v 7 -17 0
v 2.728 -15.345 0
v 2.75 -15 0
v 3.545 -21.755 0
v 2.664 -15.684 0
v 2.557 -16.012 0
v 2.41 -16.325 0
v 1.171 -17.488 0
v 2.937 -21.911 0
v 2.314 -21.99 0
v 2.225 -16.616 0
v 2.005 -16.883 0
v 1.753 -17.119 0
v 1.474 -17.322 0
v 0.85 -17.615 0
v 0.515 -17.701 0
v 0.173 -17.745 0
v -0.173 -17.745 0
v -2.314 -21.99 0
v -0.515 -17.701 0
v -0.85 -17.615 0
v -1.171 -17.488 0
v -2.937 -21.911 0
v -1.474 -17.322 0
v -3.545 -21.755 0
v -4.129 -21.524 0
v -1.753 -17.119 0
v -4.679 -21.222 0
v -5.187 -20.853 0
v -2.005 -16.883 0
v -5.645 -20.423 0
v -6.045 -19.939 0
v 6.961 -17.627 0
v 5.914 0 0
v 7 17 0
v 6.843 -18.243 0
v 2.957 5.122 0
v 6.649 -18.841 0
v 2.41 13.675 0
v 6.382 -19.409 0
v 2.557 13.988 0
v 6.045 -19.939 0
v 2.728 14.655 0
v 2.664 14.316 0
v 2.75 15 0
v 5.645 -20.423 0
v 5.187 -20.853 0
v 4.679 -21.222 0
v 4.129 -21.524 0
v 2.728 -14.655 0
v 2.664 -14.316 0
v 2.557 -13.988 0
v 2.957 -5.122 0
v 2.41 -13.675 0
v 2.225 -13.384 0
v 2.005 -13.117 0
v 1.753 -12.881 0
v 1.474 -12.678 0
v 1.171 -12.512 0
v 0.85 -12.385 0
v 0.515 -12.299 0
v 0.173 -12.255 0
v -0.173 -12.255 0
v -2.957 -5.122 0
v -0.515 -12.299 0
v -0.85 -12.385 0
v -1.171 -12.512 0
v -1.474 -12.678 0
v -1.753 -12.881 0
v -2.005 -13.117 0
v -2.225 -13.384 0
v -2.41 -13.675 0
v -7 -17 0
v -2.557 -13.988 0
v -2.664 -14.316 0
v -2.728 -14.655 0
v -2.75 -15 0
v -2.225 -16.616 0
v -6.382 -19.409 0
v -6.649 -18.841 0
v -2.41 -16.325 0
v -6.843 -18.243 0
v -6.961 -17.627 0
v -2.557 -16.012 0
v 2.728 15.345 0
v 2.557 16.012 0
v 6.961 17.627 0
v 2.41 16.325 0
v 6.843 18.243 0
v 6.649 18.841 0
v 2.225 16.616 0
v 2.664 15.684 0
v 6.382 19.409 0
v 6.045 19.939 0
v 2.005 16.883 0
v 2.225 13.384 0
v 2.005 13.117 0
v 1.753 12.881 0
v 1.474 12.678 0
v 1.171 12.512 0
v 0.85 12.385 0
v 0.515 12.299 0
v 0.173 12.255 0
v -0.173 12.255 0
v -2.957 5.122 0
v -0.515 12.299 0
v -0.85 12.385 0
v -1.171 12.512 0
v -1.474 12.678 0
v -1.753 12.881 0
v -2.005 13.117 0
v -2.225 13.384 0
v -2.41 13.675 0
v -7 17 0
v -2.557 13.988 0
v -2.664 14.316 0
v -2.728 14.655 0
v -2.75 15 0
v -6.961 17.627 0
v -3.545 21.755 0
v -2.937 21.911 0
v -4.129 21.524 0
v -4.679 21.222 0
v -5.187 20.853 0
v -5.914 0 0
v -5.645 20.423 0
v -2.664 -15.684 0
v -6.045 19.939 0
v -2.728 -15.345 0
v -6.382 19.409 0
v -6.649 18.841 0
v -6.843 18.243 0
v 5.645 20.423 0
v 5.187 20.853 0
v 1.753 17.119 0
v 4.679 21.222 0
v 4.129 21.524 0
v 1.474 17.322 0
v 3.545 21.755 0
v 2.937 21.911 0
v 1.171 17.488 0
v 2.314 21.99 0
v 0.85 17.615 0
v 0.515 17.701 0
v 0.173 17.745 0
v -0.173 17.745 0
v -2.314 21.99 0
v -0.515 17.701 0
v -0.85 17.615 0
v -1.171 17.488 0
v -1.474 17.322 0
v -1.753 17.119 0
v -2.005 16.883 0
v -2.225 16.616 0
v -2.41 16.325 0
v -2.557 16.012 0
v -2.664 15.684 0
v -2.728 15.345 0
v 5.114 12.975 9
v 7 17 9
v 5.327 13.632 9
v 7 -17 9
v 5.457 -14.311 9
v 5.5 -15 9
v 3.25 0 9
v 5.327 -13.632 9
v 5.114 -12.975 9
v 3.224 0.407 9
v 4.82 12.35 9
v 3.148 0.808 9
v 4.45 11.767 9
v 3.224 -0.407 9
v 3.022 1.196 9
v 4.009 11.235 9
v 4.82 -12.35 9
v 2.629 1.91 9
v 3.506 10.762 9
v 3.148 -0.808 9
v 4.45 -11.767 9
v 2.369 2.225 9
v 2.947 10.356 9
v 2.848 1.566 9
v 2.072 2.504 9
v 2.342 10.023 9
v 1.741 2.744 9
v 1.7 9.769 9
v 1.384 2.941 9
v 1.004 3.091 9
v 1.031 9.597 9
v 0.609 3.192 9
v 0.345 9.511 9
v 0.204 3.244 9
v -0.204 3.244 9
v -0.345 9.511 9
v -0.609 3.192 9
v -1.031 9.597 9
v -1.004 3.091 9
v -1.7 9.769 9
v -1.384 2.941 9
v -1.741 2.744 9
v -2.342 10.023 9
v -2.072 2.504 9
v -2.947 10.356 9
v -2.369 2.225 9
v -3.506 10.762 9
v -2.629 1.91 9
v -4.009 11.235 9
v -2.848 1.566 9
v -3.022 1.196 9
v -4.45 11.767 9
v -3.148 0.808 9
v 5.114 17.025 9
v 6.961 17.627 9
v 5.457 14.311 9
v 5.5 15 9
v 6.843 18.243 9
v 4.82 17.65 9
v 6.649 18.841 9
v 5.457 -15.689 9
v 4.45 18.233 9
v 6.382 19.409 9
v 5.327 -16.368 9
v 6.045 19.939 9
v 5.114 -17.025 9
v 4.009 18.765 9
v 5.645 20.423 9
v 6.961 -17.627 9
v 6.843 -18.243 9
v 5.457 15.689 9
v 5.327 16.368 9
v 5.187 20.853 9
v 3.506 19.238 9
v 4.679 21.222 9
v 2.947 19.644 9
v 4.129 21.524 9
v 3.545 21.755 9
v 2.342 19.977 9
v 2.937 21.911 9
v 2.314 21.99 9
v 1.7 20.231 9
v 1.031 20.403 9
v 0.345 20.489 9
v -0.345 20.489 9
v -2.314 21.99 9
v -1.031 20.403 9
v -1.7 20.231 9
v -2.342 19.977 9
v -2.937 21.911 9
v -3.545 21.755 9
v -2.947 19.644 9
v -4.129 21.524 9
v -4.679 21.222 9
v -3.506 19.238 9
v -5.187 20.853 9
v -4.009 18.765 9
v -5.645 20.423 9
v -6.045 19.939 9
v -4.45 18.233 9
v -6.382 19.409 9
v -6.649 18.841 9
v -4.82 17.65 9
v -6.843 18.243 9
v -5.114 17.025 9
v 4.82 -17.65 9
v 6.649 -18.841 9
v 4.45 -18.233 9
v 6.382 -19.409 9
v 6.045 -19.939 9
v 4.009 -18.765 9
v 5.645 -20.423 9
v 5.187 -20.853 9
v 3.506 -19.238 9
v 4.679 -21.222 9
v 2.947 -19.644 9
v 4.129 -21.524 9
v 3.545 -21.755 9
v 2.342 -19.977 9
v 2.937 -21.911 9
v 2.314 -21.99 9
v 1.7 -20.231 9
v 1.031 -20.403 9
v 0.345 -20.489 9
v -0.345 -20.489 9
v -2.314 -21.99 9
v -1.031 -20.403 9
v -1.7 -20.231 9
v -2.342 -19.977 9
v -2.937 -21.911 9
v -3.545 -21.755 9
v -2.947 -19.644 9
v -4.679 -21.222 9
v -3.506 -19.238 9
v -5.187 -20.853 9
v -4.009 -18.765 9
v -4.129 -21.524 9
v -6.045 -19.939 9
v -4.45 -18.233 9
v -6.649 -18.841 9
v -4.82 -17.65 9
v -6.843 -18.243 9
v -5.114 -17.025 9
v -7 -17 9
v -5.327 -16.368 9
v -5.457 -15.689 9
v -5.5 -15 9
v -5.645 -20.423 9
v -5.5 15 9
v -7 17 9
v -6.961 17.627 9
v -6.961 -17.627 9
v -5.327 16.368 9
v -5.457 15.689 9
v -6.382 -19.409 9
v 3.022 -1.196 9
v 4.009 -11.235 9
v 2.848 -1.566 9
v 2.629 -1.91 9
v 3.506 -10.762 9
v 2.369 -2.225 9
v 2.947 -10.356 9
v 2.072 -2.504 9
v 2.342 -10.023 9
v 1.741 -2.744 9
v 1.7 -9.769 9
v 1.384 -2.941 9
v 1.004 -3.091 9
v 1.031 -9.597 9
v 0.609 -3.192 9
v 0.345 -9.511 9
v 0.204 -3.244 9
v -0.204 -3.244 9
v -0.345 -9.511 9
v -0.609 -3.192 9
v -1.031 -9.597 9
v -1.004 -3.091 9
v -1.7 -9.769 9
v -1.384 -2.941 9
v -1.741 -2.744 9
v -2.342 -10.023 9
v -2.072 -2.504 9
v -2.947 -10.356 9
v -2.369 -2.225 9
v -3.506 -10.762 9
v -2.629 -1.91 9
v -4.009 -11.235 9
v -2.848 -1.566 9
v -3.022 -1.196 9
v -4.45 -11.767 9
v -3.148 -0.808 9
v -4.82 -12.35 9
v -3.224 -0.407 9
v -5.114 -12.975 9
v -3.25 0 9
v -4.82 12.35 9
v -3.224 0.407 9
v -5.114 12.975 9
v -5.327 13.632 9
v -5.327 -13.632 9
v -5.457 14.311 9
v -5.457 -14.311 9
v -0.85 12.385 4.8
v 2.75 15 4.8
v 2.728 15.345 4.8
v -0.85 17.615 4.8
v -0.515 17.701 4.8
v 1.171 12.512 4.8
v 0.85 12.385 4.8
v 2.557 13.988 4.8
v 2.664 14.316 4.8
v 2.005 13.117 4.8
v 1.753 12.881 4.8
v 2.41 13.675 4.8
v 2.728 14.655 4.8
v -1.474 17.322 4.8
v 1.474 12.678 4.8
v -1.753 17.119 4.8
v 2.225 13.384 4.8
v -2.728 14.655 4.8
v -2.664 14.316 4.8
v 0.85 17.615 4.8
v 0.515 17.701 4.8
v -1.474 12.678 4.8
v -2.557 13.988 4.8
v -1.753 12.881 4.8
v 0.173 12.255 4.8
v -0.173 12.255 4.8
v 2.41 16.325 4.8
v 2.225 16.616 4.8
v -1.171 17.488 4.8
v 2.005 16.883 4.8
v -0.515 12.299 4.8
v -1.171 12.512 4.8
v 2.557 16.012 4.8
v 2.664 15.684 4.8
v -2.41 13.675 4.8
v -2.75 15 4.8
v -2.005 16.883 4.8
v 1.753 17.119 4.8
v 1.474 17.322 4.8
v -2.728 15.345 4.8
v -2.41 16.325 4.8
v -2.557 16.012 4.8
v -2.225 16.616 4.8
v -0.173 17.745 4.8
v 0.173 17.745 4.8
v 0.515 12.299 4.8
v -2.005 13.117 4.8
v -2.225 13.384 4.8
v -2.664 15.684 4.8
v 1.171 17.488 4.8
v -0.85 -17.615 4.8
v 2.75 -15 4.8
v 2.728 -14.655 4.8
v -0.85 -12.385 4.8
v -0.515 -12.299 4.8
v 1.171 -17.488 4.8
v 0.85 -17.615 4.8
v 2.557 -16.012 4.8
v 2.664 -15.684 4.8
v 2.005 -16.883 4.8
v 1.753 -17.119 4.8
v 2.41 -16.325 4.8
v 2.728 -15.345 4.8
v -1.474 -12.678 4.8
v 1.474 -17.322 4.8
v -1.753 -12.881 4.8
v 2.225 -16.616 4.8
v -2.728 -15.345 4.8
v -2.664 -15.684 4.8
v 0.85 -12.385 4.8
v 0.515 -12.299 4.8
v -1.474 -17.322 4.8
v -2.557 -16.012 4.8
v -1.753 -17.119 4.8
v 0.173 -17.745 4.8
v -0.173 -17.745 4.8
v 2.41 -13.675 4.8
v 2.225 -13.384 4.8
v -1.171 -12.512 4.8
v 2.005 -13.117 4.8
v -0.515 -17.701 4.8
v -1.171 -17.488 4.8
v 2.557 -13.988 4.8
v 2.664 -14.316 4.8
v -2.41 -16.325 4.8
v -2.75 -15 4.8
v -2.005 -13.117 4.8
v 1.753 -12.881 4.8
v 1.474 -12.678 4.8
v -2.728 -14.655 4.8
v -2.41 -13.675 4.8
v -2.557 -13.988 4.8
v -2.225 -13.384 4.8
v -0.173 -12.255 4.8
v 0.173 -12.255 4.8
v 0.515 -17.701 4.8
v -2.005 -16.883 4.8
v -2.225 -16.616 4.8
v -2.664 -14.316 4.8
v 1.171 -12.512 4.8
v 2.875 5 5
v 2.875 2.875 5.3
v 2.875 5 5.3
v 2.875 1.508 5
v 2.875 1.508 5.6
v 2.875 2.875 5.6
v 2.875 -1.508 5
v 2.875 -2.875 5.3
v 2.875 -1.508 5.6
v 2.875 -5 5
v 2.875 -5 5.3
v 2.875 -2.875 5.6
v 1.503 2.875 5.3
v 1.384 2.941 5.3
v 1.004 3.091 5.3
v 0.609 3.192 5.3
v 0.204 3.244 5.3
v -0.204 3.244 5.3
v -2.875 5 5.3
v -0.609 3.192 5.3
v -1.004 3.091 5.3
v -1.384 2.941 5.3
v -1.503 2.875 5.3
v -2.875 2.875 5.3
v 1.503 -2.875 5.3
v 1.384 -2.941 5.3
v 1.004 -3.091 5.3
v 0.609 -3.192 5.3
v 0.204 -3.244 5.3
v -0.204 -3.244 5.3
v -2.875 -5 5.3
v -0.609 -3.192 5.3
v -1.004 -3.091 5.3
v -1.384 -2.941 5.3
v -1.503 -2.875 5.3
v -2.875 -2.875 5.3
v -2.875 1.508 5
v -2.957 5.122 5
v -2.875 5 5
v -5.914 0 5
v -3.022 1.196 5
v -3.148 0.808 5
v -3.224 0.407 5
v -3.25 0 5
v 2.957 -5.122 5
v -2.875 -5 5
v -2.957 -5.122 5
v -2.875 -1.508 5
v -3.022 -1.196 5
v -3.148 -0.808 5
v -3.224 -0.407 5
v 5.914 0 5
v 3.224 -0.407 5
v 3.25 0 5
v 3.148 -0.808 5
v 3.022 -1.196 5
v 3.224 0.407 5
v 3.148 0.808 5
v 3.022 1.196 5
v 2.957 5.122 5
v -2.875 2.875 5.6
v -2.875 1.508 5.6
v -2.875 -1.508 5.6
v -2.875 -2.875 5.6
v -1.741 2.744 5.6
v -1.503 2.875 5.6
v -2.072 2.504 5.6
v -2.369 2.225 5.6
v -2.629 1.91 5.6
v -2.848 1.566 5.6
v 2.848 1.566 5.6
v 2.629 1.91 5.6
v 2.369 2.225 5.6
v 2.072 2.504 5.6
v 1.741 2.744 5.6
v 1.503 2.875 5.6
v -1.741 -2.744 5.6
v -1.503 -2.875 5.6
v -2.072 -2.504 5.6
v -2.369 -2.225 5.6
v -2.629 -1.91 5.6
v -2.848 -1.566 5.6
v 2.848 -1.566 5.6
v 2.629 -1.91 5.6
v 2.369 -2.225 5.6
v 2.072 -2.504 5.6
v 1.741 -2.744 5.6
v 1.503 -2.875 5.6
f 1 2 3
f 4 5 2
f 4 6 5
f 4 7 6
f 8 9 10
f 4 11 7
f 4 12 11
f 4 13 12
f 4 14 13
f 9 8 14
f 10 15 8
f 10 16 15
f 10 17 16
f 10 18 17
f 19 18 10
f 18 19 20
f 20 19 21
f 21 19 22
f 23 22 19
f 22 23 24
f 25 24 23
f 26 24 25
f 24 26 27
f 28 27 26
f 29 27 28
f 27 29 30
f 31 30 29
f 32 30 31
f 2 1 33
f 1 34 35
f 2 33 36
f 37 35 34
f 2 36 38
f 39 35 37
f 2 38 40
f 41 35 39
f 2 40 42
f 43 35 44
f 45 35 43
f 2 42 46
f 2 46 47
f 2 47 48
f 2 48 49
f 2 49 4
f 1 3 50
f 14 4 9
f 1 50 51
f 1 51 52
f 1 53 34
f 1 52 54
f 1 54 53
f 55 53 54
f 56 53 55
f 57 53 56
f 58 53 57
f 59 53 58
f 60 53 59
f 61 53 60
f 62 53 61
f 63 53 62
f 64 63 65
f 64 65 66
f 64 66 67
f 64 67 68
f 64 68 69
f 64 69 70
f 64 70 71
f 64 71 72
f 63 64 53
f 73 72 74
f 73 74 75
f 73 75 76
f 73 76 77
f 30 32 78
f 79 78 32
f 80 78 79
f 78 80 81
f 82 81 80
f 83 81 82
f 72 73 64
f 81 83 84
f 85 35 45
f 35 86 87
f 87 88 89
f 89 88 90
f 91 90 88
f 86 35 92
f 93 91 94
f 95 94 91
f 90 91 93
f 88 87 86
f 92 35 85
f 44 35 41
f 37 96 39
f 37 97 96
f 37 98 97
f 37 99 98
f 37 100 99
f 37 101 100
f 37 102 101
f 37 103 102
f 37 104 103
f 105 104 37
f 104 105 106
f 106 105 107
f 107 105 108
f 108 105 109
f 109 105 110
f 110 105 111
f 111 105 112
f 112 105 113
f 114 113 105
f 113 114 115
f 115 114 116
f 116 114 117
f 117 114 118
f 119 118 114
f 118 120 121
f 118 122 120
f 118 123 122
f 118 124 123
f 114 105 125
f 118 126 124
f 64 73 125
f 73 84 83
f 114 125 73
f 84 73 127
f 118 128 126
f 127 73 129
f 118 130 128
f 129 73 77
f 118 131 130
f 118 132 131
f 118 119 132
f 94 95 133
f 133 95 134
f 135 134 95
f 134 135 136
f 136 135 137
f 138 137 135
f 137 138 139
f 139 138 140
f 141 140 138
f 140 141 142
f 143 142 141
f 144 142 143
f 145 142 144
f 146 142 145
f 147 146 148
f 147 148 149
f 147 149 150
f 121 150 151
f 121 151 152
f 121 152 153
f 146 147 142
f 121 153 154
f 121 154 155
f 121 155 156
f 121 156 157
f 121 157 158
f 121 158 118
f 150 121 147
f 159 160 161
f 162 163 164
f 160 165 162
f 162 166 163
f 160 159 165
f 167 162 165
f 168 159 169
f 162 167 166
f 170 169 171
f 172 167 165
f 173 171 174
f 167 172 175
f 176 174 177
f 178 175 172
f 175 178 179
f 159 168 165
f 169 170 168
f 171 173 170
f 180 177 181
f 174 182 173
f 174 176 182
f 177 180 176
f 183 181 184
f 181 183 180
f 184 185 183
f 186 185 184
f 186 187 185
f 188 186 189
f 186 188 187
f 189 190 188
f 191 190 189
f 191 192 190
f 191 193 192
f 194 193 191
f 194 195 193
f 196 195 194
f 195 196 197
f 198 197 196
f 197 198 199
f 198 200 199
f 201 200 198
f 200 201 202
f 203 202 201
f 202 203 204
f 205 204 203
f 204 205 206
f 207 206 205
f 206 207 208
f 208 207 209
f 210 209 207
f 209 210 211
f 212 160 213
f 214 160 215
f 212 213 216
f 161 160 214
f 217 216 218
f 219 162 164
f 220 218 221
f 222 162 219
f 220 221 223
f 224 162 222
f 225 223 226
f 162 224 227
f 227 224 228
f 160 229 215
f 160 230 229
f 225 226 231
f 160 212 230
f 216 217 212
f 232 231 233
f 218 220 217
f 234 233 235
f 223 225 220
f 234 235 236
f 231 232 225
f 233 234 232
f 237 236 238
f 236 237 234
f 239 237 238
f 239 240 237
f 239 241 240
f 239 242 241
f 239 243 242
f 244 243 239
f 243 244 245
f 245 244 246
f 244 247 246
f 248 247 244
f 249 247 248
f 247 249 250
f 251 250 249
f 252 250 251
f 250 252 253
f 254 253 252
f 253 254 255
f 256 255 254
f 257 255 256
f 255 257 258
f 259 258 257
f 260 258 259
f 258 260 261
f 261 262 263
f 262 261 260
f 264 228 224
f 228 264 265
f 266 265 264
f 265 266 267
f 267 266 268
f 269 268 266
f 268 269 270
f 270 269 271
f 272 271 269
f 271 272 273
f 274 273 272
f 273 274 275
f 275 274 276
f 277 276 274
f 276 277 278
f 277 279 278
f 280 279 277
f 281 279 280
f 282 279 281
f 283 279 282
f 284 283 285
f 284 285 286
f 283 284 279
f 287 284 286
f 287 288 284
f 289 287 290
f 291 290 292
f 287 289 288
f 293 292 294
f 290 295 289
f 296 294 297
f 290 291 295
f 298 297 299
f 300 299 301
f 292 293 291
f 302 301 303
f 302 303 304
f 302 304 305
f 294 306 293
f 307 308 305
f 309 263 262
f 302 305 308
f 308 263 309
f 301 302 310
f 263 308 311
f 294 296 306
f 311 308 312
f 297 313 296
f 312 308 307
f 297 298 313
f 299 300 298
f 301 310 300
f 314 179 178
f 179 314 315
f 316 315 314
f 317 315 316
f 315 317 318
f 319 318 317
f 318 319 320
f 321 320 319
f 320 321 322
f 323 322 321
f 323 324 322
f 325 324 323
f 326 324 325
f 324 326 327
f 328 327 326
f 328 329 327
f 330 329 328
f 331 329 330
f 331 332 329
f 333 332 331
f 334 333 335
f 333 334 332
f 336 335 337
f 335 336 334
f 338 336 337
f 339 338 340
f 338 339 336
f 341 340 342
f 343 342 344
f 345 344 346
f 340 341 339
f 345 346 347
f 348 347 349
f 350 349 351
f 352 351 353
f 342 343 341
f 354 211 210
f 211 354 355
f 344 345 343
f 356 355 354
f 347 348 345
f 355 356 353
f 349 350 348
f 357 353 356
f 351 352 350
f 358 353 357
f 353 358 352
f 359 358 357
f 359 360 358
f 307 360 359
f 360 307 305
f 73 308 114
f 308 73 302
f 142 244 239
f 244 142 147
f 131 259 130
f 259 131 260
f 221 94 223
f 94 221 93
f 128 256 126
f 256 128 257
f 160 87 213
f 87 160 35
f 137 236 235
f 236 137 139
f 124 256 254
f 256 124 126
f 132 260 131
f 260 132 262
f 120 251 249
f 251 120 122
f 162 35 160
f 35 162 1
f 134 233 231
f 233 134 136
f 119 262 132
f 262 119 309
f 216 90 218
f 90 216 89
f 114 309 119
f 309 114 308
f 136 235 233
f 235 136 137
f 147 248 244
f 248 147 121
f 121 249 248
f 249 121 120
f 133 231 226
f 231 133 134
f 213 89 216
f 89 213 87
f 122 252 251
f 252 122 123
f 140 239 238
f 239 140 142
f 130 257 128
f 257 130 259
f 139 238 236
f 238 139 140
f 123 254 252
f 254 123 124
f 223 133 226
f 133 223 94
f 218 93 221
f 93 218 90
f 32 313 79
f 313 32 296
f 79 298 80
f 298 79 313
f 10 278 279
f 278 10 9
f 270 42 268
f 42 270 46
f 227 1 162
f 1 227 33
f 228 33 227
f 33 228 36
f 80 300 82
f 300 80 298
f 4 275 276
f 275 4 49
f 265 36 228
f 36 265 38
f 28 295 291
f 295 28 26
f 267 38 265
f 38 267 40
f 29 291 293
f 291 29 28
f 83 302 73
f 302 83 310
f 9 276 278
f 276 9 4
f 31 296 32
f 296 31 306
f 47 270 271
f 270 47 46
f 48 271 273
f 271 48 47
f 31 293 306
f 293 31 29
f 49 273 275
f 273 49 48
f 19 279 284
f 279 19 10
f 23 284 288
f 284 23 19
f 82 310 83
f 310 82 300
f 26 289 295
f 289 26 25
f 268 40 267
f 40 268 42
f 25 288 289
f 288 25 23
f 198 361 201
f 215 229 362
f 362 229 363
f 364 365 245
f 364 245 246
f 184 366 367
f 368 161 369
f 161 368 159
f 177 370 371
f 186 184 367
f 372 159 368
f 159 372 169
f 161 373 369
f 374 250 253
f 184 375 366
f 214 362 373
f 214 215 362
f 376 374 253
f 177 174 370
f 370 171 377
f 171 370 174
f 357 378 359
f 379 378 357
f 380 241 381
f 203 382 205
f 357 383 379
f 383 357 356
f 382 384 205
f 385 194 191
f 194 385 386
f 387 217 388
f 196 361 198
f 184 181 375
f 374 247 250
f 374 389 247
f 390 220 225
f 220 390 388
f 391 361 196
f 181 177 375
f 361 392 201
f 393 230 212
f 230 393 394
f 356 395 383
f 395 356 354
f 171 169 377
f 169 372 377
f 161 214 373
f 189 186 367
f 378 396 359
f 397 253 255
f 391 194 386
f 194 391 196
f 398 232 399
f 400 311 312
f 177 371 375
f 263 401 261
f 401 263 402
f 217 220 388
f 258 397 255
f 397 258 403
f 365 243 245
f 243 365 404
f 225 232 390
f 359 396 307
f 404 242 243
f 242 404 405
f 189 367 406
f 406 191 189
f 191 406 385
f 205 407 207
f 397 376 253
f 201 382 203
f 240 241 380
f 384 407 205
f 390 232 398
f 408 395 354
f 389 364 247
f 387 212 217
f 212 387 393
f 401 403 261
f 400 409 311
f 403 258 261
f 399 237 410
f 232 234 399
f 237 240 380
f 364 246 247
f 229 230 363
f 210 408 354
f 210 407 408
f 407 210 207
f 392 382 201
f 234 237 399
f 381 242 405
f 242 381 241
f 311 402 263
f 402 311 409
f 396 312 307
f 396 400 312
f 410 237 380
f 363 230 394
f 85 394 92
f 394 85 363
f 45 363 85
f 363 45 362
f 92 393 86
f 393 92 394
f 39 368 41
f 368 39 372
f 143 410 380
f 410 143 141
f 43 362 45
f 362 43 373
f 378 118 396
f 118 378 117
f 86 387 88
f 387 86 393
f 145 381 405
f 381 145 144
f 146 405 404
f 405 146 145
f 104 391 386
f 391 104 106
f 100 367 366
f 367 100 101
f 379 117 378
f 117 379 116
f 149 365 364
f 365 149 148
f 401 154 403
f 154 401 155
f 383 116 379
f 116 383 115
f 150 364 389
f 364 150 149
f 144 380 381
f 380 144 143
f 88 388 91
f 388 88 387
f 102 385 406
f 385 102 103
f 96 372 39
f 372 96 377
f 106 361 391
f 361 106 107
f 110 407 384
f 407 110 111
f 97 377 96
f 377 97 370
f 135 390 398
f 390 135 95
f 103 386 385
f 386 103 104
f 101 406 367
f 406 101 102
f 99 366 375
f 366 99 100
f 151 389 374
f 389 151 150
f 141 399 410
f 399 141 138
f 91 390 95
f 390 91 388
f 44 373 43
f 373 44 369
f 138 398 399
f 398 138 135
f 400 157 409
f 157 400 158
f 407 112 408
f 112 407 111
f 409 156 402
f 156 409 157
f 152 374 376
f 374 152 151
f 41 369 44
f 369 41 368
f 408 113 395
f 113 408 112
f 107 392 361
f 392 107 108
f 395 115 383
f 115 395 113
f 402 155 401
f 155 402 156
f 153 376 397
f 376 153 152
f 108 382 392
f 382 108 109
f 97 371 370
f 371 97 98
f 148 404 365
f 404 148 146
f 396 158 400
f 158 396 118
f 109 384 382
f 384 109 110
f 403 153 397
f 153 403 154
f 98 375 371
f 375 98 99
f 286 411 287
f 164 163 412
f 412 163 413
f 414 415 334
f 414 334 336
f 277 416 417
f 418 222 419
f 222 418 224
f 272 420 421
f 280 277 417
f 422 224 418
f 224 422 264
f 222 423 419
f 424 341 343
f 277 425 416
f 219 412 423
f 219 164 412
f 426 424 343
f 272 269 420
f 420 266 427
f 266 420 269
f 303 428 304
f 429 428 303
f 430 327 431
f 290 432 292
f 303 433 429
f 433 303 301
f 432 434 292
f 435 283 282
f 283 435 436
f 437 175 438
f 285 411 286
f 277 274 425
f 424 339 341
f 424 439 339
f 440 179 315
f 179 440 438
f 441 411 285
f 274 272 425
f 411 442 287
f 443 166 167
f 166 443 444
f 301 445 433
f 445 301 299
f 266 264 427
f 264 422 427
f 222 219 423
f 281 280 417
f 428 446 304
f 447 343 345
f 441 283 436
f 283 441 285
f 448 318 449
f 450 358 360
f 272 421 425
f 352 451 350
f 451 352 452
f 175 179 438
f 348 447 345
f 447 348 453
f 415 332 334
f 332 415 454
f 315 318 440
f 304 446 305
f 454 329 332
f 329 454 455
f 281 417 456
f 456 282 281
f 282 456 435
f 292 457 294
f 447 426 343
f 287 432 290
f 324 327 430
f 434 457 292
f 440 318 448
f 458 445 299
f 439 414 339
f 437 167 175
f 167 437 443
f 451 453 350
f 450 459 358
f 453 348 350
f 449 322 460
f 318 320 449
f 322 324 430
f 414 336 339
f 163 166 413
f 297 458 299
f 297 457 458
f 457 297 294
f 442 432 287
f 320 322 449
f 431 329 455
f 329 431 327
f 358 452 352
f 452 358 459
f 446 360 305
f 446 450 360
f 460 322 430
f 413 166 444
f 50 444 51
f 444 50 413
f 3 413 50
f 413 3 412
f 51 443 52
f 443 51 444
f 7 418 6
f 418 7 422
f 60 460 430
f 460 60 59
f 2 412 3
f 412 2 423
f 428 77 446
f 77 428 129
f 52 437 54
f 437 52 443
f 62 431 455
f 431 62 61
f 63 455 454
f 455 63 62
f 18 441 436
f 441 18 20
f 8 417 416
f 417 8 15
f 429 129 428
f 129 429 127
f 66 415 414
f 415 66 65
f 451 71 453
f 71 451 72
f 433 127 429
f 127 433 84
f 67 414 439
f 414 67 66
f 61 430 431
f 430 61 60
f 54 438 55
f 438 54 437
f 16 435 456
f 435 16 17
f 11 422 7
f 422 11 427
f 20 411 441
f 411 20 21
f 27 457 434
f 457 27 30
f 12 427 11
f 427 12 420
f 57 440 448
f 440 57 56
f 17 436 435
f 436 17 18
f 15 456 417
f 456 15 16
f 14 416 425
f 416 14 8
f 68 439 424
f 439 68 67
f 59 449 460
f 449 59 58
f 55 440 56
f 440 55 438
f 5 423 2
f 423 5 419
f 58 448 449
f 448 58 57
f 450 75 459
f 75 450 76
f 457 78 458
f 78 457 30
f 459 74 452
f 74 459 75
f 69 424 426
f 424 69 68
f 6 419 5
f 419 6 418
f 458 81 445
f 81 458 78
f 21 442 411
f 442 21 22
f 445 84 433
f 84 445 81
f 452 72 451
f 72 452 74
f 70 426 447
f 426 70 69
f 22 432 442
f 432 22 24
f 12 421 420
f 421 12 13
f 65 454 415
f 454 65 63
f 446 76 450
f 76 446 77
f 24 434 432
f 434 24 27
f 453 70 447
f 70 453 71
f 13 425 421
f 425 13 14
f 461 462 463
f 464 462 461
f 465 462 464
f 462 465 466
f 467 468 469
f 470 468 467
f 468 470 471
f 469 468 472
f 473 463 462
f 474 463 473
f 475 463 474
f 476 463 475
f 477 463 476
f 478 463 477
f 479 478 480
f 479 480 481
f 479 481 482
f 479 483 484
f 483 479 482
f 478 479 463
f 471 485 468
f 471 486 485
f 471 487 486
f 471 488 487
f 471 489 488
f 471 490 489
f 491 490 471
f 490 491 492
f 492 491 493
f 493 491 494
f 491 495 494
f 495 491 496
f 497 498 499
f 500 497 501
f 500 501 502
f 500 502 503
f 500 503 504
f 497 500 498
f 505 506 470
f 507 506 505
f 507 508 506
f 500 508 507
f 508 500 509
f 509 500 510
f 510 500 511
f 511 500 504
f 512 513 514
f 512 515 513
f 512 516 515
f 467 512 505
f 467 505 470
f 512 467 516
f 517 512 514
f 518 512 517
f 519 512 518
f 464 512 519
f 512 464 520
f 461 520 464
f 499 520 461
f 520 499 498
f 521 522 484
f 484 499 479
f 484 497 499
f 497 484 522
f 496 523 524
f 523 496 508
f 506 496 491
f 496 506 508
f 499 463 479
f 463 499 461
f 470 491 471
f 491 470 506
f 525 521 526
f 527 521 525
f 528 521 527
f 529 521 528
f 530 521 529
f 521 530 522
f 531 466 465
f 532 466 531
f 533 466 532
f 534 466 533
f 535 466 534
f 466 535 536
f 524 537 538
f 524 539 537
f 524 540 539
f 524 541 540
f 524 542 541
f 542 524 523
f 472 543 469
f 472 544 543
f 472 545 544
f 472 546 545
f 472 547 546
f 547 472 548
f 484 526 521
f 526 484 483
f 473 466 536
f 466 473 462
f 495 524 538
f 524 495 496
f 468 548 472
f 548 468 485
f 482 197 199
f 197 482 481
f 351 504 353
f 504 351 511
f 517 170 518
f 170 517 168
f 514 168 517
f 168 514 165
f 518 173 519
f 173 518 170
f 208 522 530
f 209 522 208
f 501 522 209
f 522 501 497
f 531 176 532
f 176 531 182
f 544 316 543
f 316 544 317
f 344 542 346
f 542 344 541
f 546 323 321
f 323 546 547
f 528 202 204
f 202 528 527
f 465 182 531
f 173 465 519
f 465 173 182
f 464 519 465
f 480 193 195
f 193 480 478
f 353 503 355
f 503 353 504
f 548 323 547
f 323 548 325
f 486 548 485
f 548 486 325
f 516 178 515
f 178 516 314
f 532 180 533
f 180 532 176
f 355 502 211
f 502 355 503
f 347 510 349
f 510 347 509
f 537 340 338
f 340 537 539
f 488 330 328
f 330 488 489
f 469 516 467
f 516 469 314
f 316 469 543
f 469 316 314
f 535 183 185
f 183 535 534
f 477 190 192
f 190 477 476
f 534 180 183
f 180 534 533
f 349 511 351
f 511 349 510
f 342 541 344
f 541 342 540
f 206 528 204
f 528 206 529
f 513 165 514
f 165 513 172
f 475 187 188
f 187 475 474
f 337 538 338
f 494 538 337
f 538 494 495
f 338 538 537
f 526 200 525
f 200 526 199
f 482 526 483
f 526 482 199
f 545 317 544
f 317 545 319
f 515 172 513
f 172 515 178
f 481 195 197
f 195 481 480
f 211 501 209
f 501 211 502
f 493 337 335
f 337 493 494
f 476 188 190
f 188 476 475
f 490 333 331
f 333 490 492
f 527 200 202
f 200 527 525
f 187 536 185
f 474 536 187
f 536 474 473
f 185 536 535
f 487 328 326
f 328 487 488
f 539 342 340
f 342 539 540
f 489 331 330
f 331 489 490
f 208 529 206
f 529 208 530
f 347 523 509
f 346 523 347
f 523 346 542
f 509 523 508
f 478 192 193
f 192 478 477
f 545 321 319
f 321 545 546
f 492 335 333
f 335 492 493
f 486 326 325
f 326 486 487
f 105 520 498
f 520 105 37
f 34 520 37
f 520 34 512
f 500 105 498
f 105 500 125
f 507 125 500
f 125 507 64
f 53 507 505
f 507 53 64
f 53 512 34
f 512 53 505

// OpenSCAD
$fn = 50;


difference() {
	union() {
		cylinder(h = 9, r = 7.0000000000);
		translate(v = [0.0000000000, 7.5000000000, 0]) {
			hull() {
				translate(v = [-2.0000000000, 9.5000000000, 0]) {
					cylinder(h = 9, r = 5);
				}
				translate(v = [2.0000000000, 9.5000000000, 0]) {
					cylinder(h = 9, r = 5);
				}
				translate(v = [-2.0000000000, -9.5000000000, 0]) {
					cylinder(h = 9, r = 5);
				}
				translate(v = [2.0000000000, -9.5000000000, 0]) {
					cylinder(h = 9, r = 5);
				}
			}
		}
		translate(v = [0.0000000000, 7.5000000000, 0]) {
			hull() {
				translate(v = [-2.0000000000, 9.5000000000, 0]) {
					cylinder(h = 9, r = 5);
				}
				translate(v = [2.0000000000, 9.5000000000, 0]) {
					cylinder(h = 9, r = 5);
				}
				translate(v = [-2.0000000000, -9.5000000000, 0]) {
					cylinder(h = 9, r = 5);
				}
				translate(v = [2.0000000000, -9.5000000000, 0]) {
					cylinder(h = 9, r = 5);
				}
			}
		}
		translate(v = [0.0000000000, -7.5000000000, 0]) {
			hull() {
				translate(v = [-2.0000000000, 9.5000000000, 0]) {
					cylinder(h = 9, r = 5);
				}
				translate(v = [2.0000000000, 9.5000000000, 0]) {
					cylinder(h = 9, r = 5);
				}
				translate(v = [-2.0000000000, -9.5000000000, 0]) {
					cylinder(h = 9, r = 5);
				}
				translate(v = [2.0000000000, -9.5000000000, 0]) {
					cylinder(h = 9, r = 5);
				}
			}
		}
		translate(v = [0.0000000000, -7.5000000000, 0]) {
			hull() {
				translate(v = [-2.0000000000, 9.5000000000, 0]) {
					cylinder(h = 9, r = 5);
				}
				translate(v = [2.0000000000, 9.5000000000, 0]) {
					cylinder(h = 9, r = 5);
				}
				translate(v = [-2.0000000000, -9.5000000000, 0]) {
					cylinder(h = 9, r = 5);
				}
				translate(v = [2.0000000000, -9.5000000000, 0]) {
					cylinder(h = 9, r = 5);
				}
			}
		}
	}
	union() {
		translate(v = [0.0000000000, 15.0000000000, 9]) {
			rotate(a = [0, 0, 0]) {
				difference() {
					union() {
						#translate(v = [0, 0, -9.0000000000]) {
							cylinder(h = 9, r = 2.2500000000);
						}
						#translate(v = [0, 0, -4.2000000000]) {
							cylinder(h = 4.2000000000, r1 = 2.7500000000, r2 = 5.5000000000);
						}
						#translate(v = [0, 0, -9.0000000000]) {
							cylinder(h = 9, r = 2.7500000000);
						}
						#translate(v = [0, 0, -9.0000000000]) {
							cylinder(h = 9, r = 2.2500000000);
						}
					}
					union();
				}
			}
		}
		translate(v = [0.0000000000, 15.0000000000, 9]) {
			rotate(a = [0, 0, 0]) {
				difference() {
					union() {
						#translate(v = [0, 0, -9.0000000000]) {
							cylinder(h = 9, r = 2.2500000000);
						}
						#translate(v = [0, 0, -4.2000000000]) {
							cylinder(h = 4.2000000000, r1 = 2.7500000000, r2 = 5.5000000000);
						}
						#translate(v = [0, 0, -9.0000000000]) {
							cylinder(h = 9, r = 2.7500000000);
						}
						#translate(v = [0, 0, -9.0000000000]) {
							cylinder(h = 9, r = 2.2500000000);
						}
					}
					union();
				}
			}
		}
		translate(v = [0.0000000000, -15.0000000000, 9]) {
			rotate(a = [0, 0, 0]) {
				difference() {
					union() {
						#translate(v = [0, 0, -9.0000000000]) {
							cylinder(h = 9, r = 2.2500000000);
						}
						#translate(v = [0, 0, -4.2000000000]) {
							cylinder(h = 4.2000000000, r1 = 2.7500000000, r2 = 5.5000000000);
						}
						#translate(v = [0, 0, -9.0000000000]) {
							cylinder(h = 9, r = 2.7500000000);
						}
						#translate(v = [0, 0, -9.0000000000]) {
							cylinder(h = 9, r = 2.2500000000);
						}
					}
					union();
				}
			}
		}
		translate(v = [0.0000000000, -15.0000000000, 9]) {
			rotate(a = [0, 0, 0]) {
				difference() {
					union() {
						#translate(v = [0, 0, -9.0000000000]) {
							cylinder(h = 9, r = 2.2500000000);
						}
						#translate(v = [0, 0, -4.2000000000]) {
							cylinder(h = 4.2000000000, r1 = 2.7500000000, r2 = 5.5000000000);
						}
						#translate(v = [0, 0, -9.0000000000]) {
							cylinder(h = 9, r = 2.7500000000);
						}
						#translate(v = [0, 0, -9.0000000000]) {
							cylinder(h = 9, r = 2.2500000000);
						}
					}
					union();
				}
			}
		}
		translate(v = [0.0000000000, 0.0000000000, 0]) {
			rotate(a = [0, 0, 0]) {
				difference() {
					union() {
						#translate(v = [-2.8750000000, -5.0000000000, -0.3000000000]) {
							cube(size = [5.7500000000, 10, 0.3000000000]);
						}
						#translate(v = [-2.8750000000, -2.8750000000, -0.6000000000]) {
							cube(size = [5.7500000000, 5.7500000000, 0.3000000000]);
						}
						#translate(v = [-2.8750000000, -5.0000000000, 5]) {
							cube(size = [5.7500000000, 10, 0.3000000000]);
						}
						#translate(v = [-2.8750000000, -2.8750000000, 5.3000000000]) {
							cube(size = [5.7500000000, 5.7500000000, 0.3000000000]);
						}
						#translate(v = [0, 0, -100.0000000000]) {
							cylinder(h = 200, r = 3.2500000000);
						}
						#linear_extrude(height = 5) {
							polygon(points = [[5.9142500000, 0.0000000000], [2.9571250000, 5.1218907443], [-2.9571250000, 5.1218907443], [-5.9142500000, 0.0000000000], [-2.9571250000, -5.1218907443], [2.9571250000, -5.1218907443]]);
						}
						#translate(v = [-2.8750000000, -5.0000000000, -0.3000000000]) {
							cube(size = [5.7500000000, 10, 0.3000000000]);
						}
						#translate(v = [-2.8750000000, -2.8750000000, -0.6000000000]) {
							cube(size = [5.7500000000, 5.7500000000, 0.3000000000]);
						}
						#translate(v = [-2.8750000000, -5.0000000000, 5]) {
							cube(size = [5.7500000000, 10, 0.3000000000]);
						}
						#translate(v = [-2.8750000000, -2.8750000000, 5.3000000000]) {
							cube(size = [5.7500000000, 5.7500000000, 0.3000000000]);
						}
						#translate(v = [0, 0, -100.0000000000]) {
							cylinder(h = 200, r = 3.2500000000);
						}
						#translate(v = [-2.8750000000, -5.0000000000, -0.3000000000]) {
							cube(size = [5.7500000000, 10, 0.3000000000]);
						}
						#translate(v = [-2.8750000000, -2.8750000000, -0.6000000000]) {
							cube(size = [5.7500000000, 5.7500000000, 0.3000000000]);
						}
						#translate(v = [-2.8750000000, -5.0000000000, 5]) {
							cube(size = [5.7500000000, 10, 0.3000000000]);
						}
						#translate(v = [-2.8750000000, -2.8750000000, 5.3000000000]) {
							cube(size = [5.7500000000, 5.7500000000, 0.3000000000]);
						}
						#translate(v = [0, 0, -100.0000000000]) {
							cylinder(h = 200, r = 3.2500000000);
						}
					}
					union();
				}
			}
		}
		translate(v = [0, 0, -100]) {
			cylinder(h = 200, r = 3.2500000000);
		}
		translate(v = [0, 0, -100]) {
			cylinder(h = 200, r = 1.8000000000);
		}
	}
}
